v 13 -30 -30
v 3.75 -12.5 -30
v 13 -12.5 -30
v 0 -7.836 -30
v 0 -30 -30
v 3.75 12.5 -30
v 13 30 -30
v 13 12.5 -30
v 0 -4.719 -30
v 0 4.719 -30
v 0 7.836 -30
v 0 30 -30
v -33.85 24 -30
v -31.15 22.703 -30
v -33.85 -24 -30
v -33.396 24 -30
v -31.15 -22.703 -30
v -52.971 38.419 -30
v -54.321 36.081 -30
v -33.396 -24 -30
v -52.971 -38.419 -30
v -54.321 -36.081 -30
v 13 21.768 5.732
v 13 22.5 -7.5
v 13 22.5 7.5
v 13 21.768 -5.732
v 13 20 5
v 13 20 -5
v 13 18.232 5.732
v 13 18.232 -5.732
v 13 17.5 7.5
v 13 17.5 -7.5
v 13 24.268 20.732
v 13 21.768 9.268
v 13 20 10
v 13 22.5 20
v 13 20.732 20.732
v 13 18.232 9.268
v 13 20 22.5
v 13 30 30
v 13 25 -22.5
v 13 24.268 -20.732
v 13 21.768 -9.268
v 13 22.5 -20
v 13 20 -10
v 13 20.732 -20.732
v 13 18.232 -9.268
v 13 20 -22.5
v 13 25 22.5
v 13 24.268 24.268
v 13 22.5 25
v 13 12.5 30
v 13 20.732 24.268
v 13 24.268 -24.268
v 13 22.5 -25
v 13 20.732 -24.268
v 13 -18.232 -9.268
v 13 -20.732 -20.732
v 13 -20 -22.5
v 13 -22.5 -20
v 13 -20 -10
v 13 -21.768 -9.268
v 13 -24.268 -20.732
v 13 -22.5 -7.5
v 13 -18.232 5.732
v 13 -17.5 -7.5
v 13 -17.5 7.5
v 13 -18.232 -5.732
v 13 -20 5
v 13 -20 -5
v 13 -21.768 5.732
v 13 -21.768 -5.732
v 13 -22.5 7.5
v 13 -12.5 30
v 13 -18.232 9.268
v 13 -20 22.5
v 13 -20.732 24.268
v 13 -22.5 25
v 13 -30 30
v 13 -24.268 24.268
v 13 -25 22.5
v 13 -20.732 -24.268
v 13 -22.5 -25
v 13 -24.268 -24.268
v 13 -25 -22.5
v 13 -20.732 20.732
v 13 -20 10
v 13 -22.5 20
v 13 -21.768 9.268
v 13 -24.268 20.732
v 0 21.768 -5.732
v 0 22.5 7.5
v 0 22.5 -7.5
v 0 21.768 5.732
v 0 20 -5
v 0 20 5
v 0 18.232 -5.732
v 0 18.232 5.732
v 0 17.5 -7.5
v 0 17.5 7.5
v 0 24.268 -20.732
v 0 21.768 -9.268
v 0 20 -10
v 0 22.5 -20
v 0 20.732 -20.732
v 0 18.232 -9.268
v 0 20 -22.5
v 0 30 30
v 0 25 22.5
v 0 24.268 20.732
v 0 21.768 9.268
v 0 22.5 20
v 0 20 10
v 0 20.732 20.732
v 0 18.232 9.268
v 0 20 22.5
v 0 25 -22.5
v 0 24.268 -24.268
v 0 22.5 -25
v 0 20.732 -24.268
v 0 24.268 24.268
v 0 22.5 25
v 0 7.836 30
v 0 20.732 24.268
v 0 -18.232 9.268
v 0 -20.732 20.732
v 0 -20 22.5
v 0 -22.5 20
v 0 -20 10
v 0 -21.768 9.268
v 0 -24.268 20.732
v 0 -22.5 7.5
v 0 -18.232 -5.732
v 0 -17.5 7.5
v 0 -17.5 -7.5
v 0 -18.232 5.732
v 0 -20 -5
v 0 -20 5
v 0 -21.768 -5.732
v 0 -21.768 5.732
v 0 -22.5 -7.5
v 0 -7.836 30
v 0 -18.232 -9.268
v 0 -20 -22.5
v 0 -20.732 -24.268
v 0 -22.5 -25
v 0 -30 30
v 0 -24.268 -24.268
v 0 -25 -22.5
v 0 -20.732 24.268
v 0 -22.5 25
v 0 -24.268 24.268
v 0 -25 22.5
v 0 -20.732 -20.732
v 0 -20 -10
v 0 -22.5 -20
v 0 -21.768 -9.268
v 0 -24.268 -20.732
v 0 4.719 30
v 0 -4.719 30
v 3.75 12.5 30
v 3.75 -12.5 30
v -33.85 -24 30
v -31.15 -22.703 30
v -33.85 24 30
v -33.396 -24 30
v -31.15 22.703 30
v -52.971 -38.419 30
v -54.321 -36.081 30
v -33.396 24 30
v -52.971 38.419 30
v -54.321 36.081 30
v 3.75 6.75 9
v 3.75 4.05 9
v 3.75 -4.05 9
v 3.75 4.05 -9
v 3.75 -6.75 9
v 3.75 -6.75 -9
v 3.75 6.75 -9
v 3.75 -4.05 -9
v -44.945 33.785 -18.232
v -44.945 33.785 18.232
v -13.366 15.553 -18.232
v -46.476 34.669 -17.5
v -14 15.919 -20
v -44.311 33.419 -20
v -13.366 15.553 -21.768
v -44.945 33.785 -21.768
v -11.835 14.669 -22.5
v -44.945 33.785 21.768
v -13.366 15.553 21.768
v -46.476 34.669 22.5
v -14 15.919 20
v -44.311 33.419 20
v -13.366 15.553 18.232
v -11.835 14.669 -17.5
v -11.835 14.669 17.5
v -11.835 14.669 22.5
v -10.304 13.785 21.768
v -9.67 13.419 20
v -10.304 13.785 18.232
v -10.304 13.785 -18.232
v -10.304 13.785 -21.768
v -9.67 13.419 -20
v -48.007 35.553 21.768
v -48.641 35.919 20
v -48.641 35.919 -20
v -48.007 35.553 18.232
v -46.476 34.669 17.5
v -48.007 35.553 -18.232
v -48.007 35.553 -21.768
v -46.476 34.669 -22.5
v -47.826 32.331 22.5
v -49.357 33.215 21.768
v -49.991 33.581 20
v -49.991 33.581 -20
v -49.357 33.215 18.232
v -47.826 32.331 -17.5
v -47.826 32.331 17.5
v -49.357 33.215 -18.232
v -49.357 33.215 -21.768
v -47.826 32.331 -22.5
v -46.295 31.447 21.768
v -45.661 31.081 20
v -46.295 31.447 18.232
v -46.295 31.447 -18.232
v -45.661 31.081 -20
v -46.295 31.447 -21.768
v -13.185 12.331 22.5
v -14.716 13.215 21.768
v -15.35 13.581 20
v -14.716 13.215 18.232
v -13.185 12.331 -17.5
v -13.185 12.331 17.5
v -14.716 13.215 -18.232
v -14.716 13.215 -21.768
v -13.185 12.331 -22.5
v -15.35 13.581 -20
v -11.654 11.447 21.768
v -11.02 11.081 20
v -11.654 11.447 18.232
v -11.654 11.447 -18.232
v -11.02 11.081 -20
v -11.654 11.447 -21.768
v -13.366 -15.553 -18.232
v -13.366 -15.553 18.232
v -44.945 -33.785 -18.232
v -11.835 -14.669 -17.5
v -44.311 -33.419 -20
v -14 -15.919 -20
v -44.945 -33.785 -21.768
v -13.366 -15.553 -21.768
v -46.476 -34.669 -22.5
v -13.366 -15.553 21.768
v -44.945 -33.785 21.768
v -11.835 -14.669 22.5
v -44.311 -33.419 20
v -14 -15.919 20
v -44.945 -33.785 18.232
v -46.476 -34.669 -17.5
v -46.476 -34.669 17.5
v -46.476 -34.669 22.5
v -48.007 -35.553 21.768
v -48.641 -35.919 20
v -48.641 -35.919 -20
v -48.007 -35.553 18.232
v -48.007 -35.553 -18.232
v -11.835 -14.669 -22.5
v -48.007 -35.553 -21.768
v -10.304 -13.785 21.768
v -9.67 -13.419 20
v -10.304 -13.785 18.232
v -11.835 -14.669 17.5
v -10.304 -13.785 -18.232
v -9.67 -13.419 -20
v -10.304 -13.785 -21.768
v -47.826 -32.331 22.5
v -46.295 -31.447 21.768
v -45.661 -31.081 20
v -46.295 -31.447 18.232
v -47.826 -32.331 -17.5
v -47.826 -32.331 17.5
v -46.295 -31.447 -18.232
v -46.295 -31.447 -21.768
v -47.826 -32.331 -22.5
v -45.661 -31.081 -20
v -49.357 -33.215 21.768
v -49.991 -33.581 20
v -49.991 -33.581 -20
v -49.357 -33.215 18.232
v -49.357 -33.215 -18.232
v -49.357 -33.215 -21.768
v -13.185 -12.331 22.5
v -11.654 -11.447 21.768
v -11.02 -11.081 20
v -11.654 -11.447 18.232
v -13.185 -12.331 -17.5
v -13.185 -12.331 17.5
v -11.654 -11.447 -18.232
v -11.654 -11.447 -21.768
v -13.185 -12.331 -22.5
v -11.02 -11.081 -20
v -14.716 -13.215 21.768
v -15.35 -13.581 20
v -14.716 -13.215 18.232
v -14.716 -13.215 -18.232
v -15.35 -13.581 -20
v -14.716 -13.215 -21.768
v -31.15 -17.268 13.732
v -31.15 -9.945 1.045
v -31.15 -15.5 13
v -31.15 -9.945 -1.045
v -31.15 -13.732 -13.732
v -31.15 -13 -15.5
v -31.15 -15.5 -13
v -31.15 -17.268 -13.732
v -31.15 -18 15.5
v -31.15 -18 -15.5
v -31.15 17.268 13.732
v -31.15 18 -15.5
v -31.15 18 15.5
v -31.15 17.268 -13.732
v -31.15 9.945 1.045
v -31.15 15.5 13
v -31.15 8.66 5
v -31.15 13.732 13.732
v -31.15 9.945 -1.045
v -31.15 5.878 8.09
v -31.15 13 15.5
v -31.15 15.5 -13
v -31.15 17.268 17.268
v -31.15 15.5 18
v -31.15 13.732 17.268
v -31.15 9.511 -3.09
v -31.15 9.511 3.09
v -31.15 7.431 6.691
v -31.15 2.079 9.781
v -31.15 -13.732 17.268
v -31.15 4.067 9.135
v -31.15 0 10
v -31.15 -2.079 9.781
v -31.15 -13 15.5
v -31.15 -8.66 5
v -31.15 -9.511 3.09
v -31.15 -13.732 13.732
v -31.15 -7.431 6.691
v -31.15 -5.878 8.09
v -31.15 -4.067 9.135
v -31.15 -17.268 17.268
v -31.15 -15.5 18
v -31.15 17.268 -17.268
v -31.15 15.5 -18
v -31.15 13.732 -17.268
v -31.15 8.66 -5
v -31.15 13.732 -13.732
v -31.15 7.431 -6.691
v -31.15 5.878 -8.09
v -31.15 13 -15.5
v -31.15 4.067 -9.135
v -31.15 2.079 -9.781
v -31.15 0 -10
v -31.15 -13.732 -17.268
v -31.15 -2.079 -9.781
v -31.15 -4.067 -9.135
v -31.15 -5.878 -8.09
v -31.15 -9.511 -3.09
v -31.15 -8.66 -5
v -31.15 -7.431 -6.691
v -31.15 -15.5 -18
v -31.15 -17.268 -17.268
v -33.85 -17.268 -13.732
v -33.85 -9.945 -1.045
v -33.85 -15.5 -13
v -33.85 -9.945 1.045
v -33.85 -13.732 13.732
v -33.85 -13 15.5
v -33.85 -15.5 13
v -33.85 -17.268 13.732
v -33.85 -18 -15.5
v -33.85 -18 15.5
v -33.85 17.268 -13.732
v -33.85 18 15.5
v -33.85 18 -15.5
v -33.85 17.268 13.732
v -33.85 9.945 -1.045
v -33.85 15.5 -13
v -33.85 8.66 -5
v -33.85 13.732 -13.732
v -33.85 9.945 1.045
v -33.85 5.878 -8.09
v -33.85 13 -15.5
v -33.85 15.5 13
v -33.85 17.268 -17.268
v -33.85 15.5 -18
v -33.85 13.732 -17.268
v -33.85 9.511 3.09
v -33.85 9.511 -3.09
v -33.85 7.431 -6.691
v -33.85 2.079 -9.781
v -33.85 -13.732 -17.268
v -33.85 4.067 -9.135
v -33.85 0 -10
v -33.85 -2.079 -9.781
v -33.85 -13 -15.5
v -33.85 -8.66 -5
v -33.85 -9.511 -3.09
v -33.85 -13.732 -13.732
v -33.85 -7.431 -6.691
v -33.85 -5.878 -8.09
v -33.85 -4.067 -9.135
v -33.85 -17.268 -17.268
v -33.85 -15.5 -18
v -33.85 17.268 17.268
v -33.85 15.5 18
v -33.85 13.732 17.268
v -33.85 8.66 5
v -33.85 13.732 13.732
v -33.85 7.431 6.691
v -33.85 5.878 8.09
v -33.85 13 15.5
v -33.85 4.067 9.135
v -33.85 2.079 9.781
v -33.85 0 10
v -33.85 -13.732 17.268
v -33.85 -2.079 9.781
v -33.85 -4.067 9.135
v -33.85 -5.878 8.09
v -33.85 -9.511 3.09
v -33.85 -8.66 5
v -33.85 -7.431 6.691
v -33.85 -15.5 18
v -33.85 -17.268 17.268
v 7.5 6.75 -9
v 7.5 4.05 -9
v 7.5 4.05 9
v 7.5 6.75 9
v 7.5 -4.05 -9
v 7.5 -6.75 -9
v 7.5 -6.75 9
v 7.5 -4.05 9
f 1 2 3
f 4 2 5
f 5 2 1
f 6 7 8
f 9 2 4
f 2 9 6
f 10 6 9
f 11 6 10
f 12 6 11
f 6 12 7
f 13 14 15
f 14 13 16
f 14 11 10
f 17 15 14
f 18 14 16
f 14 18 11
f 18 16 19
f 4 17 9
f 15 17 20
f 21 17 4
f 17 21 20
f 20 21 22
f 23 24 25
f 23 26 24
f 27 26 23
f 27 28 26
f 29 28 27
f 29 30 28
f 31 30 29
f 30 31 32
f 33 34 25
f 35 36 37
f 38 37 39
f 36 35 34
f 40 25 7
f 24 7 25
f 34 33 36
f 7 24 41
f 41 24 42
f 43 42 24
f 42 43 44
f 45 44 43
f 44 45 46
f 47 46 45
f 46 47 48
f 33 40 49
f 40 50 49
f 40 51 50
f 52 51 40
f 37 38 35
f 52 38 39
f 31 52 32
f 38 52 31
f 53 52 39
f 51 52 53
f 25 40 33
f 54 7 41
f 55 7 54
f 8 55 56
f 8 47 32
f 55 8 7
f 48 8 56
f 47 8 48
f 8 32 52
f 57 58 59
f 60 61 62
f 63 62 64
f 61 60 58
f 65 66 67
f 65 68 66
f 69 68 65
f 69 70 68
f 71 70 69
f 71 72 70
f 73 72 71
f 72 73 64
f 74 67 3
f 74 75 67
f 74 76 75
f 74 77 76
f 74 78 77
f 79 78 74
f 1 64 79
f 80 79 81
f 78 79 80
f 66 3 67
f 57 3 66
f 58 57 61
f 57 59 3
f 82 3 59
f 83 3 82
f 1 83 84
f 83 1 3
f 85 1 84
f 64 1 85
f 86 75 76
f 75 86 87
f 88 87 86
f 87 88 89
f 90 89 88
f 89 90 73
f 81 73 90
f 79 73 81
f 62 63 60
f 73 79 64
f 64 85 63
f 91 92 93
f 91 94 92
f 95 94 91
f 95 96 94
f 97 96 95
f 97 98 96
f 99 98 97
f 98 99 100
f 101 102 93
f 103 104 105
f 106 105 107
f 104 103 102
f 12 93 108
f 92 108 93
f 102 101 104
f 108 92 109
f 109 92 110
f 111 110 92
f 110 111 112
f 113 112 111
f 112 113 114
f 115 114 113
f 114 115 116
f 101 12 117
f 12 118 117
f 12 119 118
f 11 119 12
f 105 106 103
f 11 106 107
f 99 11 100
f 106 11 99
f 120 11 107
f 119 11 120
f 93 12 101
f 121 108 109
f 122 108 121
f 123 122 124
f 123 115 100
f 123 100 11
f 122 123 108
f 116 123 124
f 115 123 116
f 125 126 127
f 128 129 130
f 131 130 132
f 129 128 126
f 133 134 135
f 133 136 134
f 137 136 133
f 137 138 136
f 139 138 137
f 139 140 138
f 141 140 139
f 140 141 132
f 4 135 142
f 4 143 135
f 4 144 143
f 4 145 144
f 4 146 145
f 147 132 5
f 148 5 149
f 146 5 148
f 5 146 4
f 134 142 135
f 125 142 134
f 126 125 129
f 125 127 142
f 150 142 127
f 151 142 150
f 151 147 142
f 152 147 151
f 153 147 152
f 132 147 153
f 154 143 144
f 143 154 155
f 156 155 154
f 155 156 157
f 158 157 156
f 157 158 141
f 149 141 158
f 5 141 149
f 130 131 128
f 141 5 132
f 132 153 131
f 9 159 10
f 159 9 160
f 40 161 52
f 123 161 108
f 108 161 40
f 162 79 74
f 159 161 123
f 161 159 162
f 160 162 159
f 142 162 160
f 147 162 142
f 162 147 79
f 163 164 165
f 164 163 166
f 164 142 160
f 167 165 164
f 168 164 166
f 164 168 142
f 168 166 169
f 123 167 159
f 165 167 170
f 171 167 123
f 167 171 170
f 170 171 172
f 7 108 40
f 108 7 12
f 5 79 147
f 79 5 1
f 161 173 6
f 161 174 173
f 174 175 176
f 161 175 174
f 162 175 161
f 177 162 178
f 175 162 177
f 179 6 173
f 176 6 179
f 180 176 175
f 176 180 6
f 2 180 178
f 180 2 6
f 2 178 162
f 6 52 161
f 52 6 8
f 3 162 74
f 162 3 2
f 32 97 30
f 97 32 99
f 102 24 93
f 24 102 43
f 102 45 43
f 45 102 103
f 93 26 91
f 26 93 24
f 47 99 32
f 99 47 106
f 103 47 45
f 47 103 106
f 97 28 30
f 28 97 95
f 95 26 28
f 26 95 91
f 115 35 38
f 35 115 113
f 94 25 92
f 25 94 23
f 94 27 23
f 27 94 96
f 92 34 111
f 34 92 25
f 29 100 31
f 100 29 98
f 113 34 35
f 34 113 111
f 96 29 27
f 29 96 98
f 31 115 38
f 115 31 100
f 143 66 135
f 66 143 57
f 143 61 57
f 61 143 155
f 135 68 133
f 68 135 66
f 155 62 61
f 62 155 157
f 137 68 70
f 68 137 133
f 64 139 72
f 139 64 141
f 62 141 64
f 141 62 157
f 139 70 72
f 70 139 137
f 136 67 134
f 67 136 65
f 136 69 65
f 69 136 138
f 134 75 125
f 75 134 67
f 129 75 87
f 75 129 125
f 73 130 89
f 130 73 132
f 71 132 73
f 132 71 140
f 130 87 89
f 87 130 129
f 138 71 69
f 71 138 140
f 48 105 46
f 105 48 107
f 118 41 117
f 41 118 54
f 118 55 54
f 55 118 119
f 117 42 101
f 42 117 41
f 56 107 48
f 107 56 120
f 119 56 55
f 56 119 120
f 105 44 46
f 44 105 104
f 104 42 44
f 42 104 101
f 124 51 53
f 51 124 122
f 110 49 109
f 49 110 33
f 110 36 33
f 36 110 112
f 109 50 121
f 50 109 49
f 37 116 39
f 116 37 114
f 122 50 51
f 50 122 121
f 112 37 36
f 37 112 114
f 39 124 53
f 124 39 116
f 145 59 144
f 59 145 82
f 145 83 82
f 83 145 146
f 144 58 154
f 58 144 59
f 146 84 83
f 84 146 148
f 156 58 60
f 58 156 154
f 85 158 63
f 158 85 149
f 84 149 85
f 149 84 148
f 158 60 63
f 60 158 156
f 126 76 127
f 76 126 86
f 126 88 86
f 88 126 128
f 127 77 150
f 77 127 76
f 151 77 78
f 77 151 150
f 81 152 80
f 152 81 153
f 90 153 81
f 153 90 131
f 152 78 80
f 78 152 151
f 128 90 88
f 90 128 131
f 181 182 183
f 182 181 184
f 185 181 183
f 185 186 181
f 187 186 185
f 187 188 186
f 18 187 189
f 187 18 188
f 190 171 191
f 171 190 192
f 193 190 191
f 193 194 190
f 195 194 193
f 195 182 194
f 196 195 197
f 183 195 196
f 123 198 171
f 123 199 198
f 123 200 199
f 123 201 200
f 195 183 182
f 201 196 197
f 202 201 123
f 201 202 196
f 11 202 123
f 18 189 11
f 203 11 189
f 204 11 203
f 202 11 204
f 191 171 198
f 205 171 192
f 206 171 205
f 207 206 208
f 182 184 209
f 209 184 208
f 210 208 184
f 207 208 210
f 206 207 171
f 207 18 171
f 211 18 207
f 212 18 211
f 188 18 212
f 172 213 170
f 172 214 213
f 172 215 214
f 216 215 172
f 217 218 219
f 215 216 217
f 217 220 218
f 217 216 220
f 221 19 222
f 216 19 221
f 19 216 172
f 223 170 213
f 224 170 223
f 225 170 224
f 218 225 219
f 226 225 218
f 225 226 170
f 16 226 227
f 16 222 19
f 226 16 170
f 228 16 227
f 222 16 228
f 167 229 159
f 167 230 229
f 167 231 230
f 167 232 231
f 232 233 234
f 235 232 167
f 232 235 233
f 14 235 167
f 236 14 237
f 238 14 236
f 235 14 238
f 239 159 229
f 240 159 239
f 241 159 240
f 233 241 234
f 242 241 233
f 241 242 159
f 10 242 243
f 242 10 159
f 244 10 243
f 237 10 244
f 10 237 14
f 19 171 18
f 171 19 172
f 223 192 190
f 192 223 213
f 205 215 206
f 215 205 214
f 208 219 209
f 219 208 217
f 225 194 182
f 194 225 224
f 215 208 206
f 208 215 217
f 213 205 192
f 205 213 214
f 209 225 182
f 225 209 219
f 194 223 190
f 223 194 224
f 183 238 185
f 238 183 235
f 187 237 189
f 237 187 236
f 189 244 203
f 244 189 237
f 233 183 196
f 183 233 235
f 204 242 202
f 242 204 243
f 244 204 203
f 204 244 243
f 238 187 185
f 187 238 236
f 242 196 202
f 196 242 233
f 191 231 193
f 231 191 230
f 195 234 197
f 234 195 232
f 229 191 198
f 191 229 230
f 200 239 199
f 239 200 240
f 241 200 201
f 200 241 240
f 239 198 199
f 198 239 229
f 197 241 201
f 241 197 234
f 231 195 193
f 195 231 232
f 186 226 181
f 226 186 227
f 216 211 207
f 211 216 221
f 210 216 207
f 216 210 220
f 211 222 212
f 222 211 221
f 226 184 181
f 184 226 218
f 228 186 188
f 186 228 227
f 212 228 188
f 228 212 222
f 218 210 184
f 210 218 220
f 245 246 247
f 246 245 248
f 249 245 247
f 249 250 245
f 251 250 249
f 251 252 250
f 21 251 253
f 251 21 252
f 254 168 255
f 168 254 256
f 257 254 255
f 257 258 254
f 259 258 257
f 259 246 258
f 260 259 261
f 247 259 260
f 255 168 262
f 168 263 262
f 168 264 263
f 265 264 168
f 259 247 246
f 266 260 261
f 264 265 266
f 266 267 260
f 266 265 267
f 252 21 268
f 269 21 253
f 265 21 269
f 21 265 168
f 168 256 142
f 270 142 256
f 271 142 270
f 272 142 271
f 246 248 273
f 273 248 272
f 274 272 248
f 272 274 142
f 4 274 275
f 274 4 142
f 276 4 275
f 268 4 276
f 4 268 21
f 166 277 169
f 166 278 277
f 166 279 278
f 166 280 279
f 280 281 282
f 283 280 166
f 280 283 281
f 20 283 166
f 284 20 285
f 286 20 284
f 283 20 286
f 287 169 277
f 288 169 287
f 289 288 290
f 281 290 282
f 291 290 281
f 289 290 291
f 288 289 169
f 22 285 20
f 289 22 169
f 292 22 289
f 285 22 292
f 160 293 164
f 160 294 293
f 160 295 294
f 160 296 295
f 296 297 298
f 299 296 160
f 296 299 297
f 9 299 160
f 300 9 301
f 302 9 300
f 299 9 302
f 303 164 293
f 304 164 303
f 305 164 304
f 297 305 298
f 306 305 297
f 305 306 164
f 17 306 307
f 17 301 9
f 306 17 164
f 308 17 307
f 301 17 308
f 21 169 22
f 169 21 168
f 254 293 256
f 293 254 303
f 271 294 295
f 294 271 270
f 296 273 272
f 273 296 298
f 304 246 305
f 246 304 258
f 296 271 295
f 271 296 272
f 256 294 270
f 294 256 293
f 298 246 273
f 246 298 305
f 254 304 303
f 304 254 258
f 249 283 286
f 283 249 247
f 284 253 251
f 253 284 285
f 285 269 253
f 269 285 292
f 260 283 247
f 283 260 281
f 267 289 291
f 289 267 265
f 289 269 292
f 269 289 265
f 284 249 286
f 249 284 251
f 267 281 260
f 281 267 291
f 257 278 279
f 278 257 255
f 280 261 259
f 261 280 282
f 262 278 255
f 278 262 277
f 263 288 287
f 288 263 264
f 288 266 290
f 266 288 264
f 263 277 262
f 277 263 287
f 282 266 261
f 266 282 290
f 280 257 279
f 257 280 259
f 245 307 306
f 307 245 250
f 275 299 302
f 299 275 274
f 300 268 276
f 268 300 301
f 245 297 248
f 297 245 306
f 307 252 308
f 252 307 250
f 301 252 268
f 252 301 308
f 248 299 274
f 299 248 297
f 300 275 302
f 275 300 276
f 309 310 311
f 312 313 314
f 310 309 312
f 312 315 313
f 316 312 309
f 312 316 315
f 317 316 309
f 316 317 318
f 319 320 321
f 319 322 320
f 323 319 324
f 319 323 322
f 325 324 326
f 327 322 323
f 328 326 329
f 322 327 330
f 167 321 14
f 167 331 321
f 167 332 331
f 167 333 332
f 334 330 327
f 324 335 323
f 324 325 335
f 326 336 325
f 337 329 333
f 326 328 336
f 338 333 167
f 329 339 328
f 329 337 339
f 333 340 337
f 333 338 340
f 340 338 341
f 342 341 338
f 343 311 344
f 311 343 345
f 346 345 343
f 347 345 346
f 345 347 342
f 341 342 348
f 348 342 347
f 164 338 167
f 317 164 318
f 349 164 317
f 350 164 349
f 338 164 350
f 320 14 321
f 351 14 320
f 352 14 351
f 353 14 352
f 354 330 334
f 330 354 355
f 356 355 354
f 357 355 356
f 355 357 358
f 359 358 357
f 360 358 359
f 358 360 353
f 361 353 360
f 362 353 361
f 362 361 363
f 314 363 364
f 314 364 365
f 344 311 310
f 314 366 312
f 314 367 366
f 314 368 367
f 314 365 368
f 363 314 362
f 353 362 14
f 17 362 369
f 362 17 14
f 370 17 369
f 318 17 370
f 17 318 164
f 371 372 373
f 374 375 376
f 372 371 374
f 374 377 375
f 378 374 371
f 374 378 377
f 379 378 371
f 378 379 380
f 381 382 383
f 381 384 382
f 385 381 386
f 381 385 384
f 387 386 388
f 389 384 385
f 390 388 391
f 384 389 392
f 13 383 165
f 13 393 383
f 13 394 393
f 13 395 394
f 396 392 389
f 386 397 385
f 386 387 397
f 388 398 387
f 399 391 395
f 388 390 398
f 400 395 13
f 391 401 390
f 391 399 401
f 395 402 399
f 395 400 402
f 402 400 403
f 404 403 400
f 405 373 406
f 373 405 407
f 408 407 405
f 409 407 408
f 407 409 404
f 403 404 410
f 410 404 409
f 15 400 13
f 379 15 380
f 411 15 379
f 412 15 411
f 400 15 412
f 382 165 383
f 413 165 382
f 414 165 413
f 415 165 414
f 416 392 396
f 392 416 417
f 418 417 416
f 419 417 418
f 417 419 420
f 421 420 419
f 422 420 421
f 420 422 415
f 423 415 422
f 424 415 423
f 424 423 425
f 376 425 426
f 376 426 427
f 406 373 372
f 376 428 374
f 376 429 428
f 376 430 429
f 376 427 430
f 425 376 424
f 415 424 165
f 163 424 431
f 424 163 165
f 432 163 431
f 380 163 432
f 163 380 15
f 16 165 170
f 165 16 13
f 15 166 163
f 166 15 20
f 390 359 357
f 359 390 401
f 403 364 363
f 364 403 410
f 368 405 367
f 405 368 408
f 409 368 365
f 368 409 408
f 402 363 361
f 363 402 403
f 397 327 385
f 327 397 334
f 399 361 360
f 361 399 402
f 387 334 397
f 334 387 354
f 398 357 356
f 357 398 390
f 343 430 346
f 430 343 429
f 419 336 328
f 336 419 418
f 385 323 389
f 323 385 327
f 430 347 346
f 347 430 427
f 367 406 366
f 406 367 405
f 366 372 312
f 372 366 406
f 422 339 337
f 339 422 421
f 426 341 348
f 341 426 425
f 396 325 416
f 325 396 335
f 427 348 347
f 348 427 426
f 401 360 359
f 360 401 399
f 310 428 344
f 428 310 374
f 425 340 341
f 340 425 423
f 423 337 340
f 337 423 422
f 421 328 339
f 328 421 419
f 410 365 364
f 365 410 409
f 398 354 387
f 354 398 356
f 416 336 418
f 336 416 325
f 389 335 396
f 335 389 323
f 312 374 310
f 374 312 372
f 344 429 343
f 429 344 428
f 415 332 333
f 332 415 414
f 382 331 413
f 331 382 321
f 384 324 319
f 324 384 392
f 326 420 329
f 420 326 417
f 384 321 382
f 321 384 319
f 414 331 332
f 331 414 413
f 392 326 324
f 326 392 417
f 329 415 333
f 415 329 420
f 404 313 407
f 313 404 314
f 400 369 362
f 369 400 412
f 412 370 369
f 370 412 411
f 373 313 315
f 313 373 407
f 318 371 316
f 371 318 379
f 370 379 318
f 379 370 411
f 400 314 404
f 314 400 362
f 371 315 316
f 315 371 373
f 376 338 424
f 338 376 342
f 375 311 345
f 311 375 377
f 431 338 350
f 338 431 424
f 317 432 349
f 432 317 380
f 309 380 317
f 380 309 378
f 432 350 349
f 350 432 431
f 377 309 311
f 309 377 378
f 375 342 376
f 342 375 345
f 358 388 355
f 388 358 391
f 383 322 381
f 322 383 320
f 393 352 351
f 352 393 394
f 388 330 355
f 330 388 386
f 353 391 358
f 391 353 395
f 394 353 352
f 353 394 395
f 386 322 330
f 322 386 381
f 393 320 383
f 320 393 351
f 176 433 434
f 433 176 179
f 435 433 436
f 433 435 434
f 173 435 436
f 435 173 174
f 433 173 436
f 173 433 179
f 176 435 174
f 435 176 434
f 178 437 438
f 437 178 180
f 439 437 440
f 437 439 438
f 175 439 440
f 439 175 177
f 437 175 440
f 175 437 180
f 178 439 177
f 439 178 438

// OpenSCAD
// Gen1_delta MotorMount clamp
//block shape
x=60;
y=60;
z=13;

// track channel
f=x+10;
g=25;
h=9.5;
// block top
e=20;
r=y+10;
t=16.5;

// spacing of screw holes
cx=15;
cy=40;
dx=15;
dy=45;
cz=20;
dz=15.5;

//anglefloat
dk=25.5;
ck=21;

// rotation
gx=90;

rotate([0,gx,0])
difference()
{  translate([0,0,z]/2) cube ([x,y,z],center=true);
    translate([0,0,z+4]/2) cube([f,g,h],center=true);
 
  translate([cx,cy,0]/2) cylinder(d=5, h=50,  center=true);
  translate([-cx,cy,0]/2) cylinder(d=5, h=50,  center=true);
    translate([cx,-cy,0]/2) cylinder(d=5, h=50,  center=true);
    translate([-cx,-cy,0]/2) cylinder(d=5, h=50,  center=true);
 //corner holes
    translate([dy,dy,0]/2) cylinder(d=5, h=50,  center=true);
  translate([-dy,dy,0]/2) cylinder(d=5, h=50,  center=true);
    translate([dy,-dy,0]/2) cylinder(d=5, h=50,  center=true);
   translate([-dy,-dy,0]/2) cylinder(d=5, h=50,  center=true);  
    
 //   translate([dy,dx,0]/2) cylinder(d=5, h=50,  center=true);
 // translate([-dy,dx,0]/2) cylinder(d=5, h=50,  center=true);  
//  translate([dy,-dx,0]/2) cylinder(d=5, h=50,  center=true);
 // translate([-dy,-dx,0]/2) cylinder(d=5, h=50,  center=true);  
    
// translate([cx,cy,0]/2)  cylinder(d1=16, d2=8, h=7,  center=true);
// translate([-cx,cy,0]/2) cylinder(d1=16, d2=8, h=7, center=true);
 //   translate([cx,-cy,0]/2) cylinder(d1=16, d2=8, h=7,  center=true);
  //  translate([-cx,-cy,0]/2) cylinder(d1=16, d2=8, h=7,  center=true);    
// zip tie knotches    
 //   translate([0,-cy/2,11.5-10]) cube([18,3,4],center=true);
  //  translate([0,cy/2,11.5-10]) cube([18,3,4],center=true);
// removal knotches
//       translate([0,-(6.8+51)/2,11.5]) cube([8,3,4],center=true);
//   translate([0,(6.8+51)/2,11.5-10]) cube([8,3,4],center=true);
//   translate([(6.8+51)/2,0,11.5-11]) cube([3,8,2],center=true);
  // translate([-(6.8+51)/2,0,11.5-11]) cube([3,8,2],center=true);
}

//blocks for  sides of delta
translate([-dk,ck,0])rotate([0,0,-300])
difference (){
cube([2.7,65,x],center=true);
translate([0,cz+5,cz])rotate([0,90,0])cylinder(d=5, h=3, center=true);
translate([0,-cz+5,-cz])rotate([0,90,0])    
       cylinder(d=5, h=3, center=true);
     translate([0,-cz+5,cz])rotate([0,90,0])
        cylinder(d=5, h=3, center=true);
    translate([0,cz+5,-cz])rotate([0,90,0])
        cylinder(d=5, h=3, center=true);
    
};

translate([-dk,-ck,0])rotate([0,0,300])
difference (){
cube([2.7,65,x],center=true);
translate([0,cz-5,cz])rotate([0,90,0])cylinder(d=5, h=3, center=true);
translate([0,-cz-5,-cz])rotate([0,90,0])    
       cylinder(d=5, h=3, center=true);
     translate([0,-cz-5,cz])rotate([0,90,0])
        cylinder(d=5, h=3, center=true);
    translate([0,cz-5,-cz])rotate([0,90,0])
        cylinder(d=5, h=3, center=true);
    
};

//cross braceing
    translate([-(dk+7),0,0])difference (){
cube([2.7,48,x],center=true);rotate([0,90,0])
      cylinder(d=20,h=10,center=true);
    
 translate([0,dz,dz])rotate([0,90,0])cylinder(d=5, h=3, center=true);
translate([0,-dz,-dz])rotate([0,90,0])cylinder(d=5, h=3, center=true);
translate([0,-dz,dz])rotate([0,90,0])cylinder(d=5, h=3, center=true);
translate([0,dz,-dz])rotate([0,90,0])cylinder(d=5, h=3, center=true);
        
    };
  //plate for 5 bolt holes
// rotate([0,gx,0])
//difference () {
//  
//    translate([15,0,-1]) cube([4,60,28],center=true);
//    translate([0,0,-8])rotate([90,0,90]) cylinder(d=5, h=60, center=true);
//      translate([-9,20,-8])rotate([90,0,90]) cylinder(d=5, h=60, center=true);
//      translate([8,-20,-8])rotate([90,0,90]) cylinder(d=5, h=60, center=true);
  //      translate([-9,10,-8])rotate([90,0,90]) cylinder(d=5, h=60, center=true);
//      translate([8,-10,-8])rotate([90,0,90]) cylinder(d=5, h=60, center=true);
   //notch to keep opening for C-channel
  //  translate([15,0,11.25]) cube([5,25,15],center=true);
//}
// tabs for slots

rotate([0,gx,0])  translate([0,(6.8+4)/2,z-8]) cube([18,2.7,5],center=true);
rotate([0,gx,0])  translate([0,-(6.8+4)/2,z-8]) cube([18,2.7,5],center=true);
